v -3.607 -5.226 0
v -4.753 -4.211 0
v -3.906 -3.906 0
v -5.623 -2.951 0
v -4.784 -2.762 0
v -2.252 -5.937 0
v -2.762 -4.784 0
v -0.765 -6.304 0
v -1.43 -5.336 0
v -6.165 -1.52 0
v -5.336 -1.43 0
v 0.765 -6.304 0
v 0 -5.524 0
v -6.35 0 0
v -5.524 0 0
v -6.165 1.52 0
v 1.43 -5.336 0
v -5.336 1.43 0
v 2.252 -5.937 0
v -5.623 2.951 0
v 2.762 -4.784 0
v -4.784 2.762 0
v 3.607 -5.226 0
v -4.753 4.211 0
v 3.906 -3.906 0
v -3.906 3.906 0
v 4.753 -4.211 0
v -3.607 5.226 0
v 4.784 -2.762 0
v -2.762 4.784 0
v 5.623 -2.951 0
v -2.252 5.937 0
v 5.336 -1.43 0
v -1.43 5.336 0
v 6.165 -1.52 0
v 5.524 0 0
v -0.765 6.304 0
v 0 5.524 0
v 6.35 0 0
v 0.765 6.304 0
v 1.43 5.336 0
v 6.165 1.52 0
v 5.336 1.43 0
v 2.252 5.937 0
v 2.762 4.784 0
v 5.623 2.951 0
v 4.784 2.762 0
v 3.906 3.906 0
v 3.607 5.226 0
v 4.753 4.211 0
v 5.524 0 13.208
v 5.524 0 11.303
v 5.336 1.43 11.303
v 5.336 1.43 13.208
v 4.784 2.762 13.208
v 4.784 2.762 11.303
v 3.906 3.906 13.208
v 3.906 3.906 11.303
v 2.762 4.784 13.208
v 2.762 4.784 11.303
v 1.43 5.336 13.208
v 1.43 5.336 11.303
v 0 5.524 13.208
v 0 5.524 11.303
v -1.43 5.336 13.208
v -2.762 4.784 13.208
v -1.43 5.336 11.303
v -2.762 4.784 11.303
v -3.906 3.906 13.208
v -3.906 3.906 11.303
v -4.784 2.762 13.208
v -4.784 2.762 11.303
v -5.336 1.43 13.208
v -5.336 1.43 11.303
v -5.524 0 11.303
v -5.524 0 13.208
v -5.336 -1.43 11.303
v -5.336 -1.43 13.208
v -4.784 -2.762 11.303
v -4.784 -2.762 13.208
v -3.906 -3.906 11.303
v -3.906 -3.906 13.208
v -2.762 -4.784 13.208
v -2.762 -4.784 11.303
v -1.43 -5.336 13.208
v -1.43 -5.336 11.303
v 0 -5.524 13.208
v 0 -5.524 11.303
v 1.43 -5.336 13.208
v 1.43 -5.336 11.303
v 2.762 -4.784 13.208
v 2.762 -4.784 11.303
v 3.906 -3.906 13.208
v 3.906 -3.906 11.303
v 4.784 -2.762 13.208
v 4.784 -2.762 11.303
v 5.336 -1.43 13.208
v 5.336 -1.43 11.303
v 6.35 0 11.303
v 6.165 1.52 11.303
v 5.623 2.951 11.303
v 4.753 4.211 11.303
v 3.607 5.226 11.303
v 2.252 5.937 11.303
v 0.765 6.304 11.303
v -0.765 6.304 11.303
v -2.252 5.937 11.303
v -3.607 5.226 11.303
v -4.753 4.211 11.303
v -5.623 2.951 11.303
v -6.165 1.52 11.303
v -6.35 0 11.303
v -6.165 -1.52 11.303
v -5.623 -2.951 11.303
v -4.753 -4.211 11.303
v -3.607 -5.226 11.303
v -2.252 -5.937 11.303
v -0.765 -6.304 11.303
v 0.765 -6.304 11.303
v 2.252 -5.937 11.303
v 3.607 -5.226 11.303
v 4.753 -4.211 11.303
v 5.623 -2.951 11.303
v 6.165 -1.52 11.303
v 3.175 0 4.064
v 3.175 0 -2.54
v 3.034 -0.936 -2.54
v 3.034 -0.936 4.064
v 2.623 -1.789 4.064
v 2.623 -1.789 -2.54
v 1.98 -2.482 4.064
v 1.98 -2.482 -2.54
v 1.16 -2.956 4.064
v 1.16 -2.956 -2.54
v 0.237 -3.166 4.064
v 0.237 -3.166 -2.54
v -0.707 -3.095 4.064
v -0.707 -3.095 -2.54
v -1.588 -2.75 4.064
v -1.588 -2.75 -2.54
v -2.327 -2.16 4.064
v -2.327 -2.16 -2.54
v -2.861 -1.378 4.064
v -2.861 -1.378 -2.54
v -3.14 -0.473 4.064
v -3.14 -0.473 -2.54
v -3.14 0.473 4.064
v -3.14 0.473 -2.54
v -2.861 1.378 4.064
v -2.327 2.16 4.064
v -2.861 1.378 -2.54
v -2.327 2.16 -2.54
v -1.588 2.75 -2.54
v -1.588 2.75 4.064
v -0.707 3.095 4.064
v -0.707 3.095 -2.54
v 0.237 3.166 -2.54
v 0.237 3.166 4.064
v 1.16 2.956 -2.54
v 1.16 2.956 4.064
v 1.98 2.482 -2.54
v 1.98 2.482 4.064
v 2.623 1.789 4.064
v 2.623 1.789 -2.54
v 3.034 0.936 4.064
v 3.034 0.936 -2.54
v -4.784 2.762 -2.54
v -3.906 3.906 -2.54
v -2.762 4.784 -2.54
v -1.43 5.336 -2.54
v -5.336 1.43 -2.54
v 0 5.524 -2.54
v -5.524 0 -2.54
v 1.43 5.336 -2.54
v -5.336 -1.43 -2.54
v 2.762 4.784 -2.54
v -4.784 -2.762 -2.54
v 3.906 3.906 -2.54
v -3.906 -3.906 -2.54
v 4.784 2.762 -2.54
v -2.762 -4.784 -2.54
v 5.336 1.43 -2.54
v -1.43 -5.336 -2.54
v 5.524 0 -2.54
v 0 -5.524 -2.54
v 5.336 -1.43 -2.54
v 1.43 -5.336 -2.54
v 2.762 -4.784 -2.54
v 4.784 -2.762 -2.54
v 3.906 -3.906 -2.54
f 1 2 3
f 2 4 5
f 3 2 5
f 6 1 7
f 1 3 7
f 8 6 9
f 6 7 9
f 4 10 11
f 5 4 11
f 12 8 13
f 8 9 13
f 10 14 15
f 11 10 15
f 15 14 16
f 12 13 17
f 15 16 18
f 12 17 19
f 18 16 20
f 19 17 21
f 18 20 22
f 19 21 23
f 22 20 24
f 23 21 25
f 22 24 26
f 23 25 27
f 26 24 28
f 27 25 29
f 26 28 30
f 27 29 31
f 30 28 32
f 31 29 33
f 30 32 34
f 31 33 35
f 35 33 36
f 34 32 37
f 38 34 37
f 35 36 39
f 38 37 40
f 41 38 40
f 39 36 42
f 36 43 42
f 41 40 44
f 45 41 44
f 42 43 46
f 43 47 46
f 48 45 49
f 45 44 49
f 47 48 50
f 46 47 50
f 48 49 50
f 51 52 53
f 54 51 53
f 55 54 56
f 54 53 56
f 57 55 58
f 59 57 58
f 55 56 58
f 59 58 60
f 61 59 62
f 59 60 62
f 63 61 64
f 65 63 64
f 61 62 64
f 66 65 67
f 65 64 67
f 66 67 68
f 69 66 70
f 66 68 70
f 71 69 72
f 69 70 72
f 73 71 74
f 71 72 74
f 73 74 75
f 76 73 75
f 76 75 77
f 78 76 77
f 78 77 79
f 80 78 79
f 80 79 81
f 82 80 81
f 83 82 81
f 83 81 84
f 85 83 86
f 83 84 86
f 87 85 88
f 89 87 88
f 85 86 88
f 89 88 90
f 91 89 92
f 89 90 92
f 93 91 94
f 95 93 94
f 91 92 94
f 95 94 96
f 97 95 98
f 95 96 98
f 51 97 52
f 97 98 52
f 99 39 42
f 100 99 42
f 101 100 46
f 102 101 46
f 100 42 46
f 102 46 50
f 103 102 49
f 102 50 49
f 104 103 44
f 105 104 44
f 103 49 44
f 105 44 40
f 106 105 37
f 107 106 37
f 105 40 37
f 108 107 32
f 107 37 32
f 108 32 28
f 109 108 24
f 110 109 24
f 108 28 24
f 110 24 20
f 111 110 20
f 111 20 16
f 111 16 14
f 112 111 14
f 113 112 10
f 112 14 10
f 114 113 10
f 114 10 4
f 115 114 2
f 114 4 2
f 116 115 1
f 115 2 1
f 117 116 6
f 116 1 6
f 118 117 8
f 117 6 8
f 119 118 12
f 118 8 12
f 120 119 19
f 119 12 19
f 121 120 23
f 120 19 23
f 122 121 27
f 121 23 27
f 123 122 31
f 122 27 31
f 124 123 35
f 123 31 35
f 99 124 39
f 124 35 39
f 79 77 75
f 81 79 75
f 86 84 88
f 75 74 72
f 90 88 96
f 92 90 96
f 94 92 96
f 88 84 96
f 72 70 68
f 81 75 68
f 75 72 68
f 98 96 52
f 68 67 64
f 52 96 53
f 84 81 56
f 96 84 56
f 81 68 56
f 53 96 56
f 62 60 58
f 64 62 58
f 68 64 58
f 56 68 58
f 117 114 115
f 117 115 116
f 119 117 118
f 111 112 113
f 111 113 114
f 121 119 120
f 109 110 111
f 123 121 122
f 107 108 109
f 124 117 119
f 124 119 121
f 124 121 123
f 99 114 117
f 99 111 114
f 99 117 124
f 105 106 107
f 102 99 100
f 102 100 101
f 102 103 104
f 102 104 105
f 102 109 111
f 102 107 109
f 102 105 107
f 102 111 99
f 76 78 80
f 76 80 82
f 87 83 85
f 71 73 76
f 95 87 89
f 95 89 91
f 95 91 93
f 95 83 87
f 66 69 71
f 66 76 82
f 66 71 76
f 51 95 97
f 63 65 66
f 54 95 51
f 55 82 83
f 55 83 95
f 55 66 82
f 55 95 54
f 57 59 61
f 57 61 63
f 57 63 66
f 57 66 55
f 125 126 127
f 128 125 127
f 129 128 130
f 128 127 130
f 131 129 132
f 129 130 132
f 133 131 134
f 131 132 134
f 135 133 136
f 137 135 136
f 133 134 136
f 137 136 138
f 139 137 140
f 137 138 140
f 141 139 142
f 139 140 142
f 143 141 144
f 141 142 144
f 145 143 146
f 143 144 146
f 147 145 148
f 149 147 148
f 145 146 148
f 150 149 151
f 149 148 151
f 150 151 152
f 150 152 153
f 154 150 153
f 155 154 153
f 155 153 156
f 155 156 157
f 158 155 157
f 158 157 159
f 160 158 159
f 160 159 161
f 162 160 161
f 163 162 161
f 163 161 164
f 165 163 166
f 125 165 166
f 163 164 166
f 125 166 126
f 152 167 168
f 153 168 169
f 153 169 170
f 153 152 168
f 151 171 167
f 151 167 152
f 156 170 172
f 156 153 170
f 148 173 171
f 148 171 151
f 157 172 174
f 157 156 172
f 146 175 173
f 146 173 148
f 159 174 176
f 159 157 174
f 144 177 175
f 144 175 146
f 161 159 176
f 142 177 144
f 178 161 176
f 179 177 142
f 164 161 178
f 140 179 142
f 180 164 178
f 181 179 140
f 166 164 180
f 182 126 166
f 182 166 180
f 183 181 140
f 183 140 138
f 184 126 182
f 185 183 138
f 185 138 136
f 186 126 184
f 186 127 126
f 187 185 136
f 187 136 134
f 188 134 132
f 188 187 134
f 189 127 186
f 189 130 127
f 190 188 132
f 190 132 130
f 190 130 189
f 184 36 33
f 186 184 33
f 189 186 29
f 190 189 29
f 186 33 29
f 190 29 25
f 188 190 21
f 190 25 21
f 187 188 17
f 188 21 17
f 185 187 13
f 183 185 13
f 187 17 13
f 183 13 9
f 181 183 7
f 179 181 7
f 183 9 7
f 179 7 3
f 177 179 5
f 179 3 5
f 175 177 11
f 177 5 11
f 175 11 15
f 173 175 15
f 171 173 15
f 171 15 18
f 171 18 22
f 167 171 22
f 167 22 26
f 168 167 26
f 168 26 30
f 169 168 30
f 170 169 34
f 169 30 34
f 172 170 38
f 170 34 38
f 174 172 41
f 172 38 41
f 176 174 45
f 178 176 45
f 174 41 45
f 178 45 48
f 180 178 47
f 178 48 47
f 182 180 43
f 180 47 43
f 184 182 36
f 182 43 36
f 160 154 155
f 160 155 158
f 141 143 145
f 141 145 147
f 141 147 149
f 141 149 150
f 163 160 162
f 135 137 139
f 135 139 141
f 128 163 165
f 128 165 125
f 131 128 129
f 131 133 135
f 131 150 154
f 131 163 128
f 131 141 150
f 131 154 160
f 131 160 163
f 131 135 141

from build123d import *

# Parameters (mm, degrees)
F0_R     = 6.35
F1_DEPTH = 11.303
F2_R     = 5.5245
F3_DEPTH = 1.905
F4_R     = 5.5245
F5_DEPTH = 2.54
F6_R     = 3.175
F7_DEPTH = 6.604


with BuildPart() as f1:
    # F0 (on Top) → F1 (new body)
    with BuildSketch(Plane.XY):
        Circle(F0_R)
    extrude(amount=F1_DEPTH)

    # F4 (on face) → F5 (join)
    with BuildSketch(Plane(origin=(0, 0, 0), x_dir=(1, 0, 0), z_dir=(0, 0, -1))):
        Circle(F4_R)
    extrude(amount=F5_DEPTH)

    # F6 (on face) → F7 (cut)
    with BuildSketch(Plane(origin=(0, 0, -2.54), x_dir=(1, 0, 0), z_dir=(0, 0, -1))):
        Circle(F6_R)
    extrude(amount=-F7_DEPTH, mode=Mode.SUBTRACT)


with BuildPart() as f3:
    # F2 (on face) → F3 (new body)
    with BuildSketch(Plane.XY.offset(11.303)):
        Circle(F2_R)
    extrude(amount=F3_DEPTH)


solid = Compound([f1.part, f3.part])
